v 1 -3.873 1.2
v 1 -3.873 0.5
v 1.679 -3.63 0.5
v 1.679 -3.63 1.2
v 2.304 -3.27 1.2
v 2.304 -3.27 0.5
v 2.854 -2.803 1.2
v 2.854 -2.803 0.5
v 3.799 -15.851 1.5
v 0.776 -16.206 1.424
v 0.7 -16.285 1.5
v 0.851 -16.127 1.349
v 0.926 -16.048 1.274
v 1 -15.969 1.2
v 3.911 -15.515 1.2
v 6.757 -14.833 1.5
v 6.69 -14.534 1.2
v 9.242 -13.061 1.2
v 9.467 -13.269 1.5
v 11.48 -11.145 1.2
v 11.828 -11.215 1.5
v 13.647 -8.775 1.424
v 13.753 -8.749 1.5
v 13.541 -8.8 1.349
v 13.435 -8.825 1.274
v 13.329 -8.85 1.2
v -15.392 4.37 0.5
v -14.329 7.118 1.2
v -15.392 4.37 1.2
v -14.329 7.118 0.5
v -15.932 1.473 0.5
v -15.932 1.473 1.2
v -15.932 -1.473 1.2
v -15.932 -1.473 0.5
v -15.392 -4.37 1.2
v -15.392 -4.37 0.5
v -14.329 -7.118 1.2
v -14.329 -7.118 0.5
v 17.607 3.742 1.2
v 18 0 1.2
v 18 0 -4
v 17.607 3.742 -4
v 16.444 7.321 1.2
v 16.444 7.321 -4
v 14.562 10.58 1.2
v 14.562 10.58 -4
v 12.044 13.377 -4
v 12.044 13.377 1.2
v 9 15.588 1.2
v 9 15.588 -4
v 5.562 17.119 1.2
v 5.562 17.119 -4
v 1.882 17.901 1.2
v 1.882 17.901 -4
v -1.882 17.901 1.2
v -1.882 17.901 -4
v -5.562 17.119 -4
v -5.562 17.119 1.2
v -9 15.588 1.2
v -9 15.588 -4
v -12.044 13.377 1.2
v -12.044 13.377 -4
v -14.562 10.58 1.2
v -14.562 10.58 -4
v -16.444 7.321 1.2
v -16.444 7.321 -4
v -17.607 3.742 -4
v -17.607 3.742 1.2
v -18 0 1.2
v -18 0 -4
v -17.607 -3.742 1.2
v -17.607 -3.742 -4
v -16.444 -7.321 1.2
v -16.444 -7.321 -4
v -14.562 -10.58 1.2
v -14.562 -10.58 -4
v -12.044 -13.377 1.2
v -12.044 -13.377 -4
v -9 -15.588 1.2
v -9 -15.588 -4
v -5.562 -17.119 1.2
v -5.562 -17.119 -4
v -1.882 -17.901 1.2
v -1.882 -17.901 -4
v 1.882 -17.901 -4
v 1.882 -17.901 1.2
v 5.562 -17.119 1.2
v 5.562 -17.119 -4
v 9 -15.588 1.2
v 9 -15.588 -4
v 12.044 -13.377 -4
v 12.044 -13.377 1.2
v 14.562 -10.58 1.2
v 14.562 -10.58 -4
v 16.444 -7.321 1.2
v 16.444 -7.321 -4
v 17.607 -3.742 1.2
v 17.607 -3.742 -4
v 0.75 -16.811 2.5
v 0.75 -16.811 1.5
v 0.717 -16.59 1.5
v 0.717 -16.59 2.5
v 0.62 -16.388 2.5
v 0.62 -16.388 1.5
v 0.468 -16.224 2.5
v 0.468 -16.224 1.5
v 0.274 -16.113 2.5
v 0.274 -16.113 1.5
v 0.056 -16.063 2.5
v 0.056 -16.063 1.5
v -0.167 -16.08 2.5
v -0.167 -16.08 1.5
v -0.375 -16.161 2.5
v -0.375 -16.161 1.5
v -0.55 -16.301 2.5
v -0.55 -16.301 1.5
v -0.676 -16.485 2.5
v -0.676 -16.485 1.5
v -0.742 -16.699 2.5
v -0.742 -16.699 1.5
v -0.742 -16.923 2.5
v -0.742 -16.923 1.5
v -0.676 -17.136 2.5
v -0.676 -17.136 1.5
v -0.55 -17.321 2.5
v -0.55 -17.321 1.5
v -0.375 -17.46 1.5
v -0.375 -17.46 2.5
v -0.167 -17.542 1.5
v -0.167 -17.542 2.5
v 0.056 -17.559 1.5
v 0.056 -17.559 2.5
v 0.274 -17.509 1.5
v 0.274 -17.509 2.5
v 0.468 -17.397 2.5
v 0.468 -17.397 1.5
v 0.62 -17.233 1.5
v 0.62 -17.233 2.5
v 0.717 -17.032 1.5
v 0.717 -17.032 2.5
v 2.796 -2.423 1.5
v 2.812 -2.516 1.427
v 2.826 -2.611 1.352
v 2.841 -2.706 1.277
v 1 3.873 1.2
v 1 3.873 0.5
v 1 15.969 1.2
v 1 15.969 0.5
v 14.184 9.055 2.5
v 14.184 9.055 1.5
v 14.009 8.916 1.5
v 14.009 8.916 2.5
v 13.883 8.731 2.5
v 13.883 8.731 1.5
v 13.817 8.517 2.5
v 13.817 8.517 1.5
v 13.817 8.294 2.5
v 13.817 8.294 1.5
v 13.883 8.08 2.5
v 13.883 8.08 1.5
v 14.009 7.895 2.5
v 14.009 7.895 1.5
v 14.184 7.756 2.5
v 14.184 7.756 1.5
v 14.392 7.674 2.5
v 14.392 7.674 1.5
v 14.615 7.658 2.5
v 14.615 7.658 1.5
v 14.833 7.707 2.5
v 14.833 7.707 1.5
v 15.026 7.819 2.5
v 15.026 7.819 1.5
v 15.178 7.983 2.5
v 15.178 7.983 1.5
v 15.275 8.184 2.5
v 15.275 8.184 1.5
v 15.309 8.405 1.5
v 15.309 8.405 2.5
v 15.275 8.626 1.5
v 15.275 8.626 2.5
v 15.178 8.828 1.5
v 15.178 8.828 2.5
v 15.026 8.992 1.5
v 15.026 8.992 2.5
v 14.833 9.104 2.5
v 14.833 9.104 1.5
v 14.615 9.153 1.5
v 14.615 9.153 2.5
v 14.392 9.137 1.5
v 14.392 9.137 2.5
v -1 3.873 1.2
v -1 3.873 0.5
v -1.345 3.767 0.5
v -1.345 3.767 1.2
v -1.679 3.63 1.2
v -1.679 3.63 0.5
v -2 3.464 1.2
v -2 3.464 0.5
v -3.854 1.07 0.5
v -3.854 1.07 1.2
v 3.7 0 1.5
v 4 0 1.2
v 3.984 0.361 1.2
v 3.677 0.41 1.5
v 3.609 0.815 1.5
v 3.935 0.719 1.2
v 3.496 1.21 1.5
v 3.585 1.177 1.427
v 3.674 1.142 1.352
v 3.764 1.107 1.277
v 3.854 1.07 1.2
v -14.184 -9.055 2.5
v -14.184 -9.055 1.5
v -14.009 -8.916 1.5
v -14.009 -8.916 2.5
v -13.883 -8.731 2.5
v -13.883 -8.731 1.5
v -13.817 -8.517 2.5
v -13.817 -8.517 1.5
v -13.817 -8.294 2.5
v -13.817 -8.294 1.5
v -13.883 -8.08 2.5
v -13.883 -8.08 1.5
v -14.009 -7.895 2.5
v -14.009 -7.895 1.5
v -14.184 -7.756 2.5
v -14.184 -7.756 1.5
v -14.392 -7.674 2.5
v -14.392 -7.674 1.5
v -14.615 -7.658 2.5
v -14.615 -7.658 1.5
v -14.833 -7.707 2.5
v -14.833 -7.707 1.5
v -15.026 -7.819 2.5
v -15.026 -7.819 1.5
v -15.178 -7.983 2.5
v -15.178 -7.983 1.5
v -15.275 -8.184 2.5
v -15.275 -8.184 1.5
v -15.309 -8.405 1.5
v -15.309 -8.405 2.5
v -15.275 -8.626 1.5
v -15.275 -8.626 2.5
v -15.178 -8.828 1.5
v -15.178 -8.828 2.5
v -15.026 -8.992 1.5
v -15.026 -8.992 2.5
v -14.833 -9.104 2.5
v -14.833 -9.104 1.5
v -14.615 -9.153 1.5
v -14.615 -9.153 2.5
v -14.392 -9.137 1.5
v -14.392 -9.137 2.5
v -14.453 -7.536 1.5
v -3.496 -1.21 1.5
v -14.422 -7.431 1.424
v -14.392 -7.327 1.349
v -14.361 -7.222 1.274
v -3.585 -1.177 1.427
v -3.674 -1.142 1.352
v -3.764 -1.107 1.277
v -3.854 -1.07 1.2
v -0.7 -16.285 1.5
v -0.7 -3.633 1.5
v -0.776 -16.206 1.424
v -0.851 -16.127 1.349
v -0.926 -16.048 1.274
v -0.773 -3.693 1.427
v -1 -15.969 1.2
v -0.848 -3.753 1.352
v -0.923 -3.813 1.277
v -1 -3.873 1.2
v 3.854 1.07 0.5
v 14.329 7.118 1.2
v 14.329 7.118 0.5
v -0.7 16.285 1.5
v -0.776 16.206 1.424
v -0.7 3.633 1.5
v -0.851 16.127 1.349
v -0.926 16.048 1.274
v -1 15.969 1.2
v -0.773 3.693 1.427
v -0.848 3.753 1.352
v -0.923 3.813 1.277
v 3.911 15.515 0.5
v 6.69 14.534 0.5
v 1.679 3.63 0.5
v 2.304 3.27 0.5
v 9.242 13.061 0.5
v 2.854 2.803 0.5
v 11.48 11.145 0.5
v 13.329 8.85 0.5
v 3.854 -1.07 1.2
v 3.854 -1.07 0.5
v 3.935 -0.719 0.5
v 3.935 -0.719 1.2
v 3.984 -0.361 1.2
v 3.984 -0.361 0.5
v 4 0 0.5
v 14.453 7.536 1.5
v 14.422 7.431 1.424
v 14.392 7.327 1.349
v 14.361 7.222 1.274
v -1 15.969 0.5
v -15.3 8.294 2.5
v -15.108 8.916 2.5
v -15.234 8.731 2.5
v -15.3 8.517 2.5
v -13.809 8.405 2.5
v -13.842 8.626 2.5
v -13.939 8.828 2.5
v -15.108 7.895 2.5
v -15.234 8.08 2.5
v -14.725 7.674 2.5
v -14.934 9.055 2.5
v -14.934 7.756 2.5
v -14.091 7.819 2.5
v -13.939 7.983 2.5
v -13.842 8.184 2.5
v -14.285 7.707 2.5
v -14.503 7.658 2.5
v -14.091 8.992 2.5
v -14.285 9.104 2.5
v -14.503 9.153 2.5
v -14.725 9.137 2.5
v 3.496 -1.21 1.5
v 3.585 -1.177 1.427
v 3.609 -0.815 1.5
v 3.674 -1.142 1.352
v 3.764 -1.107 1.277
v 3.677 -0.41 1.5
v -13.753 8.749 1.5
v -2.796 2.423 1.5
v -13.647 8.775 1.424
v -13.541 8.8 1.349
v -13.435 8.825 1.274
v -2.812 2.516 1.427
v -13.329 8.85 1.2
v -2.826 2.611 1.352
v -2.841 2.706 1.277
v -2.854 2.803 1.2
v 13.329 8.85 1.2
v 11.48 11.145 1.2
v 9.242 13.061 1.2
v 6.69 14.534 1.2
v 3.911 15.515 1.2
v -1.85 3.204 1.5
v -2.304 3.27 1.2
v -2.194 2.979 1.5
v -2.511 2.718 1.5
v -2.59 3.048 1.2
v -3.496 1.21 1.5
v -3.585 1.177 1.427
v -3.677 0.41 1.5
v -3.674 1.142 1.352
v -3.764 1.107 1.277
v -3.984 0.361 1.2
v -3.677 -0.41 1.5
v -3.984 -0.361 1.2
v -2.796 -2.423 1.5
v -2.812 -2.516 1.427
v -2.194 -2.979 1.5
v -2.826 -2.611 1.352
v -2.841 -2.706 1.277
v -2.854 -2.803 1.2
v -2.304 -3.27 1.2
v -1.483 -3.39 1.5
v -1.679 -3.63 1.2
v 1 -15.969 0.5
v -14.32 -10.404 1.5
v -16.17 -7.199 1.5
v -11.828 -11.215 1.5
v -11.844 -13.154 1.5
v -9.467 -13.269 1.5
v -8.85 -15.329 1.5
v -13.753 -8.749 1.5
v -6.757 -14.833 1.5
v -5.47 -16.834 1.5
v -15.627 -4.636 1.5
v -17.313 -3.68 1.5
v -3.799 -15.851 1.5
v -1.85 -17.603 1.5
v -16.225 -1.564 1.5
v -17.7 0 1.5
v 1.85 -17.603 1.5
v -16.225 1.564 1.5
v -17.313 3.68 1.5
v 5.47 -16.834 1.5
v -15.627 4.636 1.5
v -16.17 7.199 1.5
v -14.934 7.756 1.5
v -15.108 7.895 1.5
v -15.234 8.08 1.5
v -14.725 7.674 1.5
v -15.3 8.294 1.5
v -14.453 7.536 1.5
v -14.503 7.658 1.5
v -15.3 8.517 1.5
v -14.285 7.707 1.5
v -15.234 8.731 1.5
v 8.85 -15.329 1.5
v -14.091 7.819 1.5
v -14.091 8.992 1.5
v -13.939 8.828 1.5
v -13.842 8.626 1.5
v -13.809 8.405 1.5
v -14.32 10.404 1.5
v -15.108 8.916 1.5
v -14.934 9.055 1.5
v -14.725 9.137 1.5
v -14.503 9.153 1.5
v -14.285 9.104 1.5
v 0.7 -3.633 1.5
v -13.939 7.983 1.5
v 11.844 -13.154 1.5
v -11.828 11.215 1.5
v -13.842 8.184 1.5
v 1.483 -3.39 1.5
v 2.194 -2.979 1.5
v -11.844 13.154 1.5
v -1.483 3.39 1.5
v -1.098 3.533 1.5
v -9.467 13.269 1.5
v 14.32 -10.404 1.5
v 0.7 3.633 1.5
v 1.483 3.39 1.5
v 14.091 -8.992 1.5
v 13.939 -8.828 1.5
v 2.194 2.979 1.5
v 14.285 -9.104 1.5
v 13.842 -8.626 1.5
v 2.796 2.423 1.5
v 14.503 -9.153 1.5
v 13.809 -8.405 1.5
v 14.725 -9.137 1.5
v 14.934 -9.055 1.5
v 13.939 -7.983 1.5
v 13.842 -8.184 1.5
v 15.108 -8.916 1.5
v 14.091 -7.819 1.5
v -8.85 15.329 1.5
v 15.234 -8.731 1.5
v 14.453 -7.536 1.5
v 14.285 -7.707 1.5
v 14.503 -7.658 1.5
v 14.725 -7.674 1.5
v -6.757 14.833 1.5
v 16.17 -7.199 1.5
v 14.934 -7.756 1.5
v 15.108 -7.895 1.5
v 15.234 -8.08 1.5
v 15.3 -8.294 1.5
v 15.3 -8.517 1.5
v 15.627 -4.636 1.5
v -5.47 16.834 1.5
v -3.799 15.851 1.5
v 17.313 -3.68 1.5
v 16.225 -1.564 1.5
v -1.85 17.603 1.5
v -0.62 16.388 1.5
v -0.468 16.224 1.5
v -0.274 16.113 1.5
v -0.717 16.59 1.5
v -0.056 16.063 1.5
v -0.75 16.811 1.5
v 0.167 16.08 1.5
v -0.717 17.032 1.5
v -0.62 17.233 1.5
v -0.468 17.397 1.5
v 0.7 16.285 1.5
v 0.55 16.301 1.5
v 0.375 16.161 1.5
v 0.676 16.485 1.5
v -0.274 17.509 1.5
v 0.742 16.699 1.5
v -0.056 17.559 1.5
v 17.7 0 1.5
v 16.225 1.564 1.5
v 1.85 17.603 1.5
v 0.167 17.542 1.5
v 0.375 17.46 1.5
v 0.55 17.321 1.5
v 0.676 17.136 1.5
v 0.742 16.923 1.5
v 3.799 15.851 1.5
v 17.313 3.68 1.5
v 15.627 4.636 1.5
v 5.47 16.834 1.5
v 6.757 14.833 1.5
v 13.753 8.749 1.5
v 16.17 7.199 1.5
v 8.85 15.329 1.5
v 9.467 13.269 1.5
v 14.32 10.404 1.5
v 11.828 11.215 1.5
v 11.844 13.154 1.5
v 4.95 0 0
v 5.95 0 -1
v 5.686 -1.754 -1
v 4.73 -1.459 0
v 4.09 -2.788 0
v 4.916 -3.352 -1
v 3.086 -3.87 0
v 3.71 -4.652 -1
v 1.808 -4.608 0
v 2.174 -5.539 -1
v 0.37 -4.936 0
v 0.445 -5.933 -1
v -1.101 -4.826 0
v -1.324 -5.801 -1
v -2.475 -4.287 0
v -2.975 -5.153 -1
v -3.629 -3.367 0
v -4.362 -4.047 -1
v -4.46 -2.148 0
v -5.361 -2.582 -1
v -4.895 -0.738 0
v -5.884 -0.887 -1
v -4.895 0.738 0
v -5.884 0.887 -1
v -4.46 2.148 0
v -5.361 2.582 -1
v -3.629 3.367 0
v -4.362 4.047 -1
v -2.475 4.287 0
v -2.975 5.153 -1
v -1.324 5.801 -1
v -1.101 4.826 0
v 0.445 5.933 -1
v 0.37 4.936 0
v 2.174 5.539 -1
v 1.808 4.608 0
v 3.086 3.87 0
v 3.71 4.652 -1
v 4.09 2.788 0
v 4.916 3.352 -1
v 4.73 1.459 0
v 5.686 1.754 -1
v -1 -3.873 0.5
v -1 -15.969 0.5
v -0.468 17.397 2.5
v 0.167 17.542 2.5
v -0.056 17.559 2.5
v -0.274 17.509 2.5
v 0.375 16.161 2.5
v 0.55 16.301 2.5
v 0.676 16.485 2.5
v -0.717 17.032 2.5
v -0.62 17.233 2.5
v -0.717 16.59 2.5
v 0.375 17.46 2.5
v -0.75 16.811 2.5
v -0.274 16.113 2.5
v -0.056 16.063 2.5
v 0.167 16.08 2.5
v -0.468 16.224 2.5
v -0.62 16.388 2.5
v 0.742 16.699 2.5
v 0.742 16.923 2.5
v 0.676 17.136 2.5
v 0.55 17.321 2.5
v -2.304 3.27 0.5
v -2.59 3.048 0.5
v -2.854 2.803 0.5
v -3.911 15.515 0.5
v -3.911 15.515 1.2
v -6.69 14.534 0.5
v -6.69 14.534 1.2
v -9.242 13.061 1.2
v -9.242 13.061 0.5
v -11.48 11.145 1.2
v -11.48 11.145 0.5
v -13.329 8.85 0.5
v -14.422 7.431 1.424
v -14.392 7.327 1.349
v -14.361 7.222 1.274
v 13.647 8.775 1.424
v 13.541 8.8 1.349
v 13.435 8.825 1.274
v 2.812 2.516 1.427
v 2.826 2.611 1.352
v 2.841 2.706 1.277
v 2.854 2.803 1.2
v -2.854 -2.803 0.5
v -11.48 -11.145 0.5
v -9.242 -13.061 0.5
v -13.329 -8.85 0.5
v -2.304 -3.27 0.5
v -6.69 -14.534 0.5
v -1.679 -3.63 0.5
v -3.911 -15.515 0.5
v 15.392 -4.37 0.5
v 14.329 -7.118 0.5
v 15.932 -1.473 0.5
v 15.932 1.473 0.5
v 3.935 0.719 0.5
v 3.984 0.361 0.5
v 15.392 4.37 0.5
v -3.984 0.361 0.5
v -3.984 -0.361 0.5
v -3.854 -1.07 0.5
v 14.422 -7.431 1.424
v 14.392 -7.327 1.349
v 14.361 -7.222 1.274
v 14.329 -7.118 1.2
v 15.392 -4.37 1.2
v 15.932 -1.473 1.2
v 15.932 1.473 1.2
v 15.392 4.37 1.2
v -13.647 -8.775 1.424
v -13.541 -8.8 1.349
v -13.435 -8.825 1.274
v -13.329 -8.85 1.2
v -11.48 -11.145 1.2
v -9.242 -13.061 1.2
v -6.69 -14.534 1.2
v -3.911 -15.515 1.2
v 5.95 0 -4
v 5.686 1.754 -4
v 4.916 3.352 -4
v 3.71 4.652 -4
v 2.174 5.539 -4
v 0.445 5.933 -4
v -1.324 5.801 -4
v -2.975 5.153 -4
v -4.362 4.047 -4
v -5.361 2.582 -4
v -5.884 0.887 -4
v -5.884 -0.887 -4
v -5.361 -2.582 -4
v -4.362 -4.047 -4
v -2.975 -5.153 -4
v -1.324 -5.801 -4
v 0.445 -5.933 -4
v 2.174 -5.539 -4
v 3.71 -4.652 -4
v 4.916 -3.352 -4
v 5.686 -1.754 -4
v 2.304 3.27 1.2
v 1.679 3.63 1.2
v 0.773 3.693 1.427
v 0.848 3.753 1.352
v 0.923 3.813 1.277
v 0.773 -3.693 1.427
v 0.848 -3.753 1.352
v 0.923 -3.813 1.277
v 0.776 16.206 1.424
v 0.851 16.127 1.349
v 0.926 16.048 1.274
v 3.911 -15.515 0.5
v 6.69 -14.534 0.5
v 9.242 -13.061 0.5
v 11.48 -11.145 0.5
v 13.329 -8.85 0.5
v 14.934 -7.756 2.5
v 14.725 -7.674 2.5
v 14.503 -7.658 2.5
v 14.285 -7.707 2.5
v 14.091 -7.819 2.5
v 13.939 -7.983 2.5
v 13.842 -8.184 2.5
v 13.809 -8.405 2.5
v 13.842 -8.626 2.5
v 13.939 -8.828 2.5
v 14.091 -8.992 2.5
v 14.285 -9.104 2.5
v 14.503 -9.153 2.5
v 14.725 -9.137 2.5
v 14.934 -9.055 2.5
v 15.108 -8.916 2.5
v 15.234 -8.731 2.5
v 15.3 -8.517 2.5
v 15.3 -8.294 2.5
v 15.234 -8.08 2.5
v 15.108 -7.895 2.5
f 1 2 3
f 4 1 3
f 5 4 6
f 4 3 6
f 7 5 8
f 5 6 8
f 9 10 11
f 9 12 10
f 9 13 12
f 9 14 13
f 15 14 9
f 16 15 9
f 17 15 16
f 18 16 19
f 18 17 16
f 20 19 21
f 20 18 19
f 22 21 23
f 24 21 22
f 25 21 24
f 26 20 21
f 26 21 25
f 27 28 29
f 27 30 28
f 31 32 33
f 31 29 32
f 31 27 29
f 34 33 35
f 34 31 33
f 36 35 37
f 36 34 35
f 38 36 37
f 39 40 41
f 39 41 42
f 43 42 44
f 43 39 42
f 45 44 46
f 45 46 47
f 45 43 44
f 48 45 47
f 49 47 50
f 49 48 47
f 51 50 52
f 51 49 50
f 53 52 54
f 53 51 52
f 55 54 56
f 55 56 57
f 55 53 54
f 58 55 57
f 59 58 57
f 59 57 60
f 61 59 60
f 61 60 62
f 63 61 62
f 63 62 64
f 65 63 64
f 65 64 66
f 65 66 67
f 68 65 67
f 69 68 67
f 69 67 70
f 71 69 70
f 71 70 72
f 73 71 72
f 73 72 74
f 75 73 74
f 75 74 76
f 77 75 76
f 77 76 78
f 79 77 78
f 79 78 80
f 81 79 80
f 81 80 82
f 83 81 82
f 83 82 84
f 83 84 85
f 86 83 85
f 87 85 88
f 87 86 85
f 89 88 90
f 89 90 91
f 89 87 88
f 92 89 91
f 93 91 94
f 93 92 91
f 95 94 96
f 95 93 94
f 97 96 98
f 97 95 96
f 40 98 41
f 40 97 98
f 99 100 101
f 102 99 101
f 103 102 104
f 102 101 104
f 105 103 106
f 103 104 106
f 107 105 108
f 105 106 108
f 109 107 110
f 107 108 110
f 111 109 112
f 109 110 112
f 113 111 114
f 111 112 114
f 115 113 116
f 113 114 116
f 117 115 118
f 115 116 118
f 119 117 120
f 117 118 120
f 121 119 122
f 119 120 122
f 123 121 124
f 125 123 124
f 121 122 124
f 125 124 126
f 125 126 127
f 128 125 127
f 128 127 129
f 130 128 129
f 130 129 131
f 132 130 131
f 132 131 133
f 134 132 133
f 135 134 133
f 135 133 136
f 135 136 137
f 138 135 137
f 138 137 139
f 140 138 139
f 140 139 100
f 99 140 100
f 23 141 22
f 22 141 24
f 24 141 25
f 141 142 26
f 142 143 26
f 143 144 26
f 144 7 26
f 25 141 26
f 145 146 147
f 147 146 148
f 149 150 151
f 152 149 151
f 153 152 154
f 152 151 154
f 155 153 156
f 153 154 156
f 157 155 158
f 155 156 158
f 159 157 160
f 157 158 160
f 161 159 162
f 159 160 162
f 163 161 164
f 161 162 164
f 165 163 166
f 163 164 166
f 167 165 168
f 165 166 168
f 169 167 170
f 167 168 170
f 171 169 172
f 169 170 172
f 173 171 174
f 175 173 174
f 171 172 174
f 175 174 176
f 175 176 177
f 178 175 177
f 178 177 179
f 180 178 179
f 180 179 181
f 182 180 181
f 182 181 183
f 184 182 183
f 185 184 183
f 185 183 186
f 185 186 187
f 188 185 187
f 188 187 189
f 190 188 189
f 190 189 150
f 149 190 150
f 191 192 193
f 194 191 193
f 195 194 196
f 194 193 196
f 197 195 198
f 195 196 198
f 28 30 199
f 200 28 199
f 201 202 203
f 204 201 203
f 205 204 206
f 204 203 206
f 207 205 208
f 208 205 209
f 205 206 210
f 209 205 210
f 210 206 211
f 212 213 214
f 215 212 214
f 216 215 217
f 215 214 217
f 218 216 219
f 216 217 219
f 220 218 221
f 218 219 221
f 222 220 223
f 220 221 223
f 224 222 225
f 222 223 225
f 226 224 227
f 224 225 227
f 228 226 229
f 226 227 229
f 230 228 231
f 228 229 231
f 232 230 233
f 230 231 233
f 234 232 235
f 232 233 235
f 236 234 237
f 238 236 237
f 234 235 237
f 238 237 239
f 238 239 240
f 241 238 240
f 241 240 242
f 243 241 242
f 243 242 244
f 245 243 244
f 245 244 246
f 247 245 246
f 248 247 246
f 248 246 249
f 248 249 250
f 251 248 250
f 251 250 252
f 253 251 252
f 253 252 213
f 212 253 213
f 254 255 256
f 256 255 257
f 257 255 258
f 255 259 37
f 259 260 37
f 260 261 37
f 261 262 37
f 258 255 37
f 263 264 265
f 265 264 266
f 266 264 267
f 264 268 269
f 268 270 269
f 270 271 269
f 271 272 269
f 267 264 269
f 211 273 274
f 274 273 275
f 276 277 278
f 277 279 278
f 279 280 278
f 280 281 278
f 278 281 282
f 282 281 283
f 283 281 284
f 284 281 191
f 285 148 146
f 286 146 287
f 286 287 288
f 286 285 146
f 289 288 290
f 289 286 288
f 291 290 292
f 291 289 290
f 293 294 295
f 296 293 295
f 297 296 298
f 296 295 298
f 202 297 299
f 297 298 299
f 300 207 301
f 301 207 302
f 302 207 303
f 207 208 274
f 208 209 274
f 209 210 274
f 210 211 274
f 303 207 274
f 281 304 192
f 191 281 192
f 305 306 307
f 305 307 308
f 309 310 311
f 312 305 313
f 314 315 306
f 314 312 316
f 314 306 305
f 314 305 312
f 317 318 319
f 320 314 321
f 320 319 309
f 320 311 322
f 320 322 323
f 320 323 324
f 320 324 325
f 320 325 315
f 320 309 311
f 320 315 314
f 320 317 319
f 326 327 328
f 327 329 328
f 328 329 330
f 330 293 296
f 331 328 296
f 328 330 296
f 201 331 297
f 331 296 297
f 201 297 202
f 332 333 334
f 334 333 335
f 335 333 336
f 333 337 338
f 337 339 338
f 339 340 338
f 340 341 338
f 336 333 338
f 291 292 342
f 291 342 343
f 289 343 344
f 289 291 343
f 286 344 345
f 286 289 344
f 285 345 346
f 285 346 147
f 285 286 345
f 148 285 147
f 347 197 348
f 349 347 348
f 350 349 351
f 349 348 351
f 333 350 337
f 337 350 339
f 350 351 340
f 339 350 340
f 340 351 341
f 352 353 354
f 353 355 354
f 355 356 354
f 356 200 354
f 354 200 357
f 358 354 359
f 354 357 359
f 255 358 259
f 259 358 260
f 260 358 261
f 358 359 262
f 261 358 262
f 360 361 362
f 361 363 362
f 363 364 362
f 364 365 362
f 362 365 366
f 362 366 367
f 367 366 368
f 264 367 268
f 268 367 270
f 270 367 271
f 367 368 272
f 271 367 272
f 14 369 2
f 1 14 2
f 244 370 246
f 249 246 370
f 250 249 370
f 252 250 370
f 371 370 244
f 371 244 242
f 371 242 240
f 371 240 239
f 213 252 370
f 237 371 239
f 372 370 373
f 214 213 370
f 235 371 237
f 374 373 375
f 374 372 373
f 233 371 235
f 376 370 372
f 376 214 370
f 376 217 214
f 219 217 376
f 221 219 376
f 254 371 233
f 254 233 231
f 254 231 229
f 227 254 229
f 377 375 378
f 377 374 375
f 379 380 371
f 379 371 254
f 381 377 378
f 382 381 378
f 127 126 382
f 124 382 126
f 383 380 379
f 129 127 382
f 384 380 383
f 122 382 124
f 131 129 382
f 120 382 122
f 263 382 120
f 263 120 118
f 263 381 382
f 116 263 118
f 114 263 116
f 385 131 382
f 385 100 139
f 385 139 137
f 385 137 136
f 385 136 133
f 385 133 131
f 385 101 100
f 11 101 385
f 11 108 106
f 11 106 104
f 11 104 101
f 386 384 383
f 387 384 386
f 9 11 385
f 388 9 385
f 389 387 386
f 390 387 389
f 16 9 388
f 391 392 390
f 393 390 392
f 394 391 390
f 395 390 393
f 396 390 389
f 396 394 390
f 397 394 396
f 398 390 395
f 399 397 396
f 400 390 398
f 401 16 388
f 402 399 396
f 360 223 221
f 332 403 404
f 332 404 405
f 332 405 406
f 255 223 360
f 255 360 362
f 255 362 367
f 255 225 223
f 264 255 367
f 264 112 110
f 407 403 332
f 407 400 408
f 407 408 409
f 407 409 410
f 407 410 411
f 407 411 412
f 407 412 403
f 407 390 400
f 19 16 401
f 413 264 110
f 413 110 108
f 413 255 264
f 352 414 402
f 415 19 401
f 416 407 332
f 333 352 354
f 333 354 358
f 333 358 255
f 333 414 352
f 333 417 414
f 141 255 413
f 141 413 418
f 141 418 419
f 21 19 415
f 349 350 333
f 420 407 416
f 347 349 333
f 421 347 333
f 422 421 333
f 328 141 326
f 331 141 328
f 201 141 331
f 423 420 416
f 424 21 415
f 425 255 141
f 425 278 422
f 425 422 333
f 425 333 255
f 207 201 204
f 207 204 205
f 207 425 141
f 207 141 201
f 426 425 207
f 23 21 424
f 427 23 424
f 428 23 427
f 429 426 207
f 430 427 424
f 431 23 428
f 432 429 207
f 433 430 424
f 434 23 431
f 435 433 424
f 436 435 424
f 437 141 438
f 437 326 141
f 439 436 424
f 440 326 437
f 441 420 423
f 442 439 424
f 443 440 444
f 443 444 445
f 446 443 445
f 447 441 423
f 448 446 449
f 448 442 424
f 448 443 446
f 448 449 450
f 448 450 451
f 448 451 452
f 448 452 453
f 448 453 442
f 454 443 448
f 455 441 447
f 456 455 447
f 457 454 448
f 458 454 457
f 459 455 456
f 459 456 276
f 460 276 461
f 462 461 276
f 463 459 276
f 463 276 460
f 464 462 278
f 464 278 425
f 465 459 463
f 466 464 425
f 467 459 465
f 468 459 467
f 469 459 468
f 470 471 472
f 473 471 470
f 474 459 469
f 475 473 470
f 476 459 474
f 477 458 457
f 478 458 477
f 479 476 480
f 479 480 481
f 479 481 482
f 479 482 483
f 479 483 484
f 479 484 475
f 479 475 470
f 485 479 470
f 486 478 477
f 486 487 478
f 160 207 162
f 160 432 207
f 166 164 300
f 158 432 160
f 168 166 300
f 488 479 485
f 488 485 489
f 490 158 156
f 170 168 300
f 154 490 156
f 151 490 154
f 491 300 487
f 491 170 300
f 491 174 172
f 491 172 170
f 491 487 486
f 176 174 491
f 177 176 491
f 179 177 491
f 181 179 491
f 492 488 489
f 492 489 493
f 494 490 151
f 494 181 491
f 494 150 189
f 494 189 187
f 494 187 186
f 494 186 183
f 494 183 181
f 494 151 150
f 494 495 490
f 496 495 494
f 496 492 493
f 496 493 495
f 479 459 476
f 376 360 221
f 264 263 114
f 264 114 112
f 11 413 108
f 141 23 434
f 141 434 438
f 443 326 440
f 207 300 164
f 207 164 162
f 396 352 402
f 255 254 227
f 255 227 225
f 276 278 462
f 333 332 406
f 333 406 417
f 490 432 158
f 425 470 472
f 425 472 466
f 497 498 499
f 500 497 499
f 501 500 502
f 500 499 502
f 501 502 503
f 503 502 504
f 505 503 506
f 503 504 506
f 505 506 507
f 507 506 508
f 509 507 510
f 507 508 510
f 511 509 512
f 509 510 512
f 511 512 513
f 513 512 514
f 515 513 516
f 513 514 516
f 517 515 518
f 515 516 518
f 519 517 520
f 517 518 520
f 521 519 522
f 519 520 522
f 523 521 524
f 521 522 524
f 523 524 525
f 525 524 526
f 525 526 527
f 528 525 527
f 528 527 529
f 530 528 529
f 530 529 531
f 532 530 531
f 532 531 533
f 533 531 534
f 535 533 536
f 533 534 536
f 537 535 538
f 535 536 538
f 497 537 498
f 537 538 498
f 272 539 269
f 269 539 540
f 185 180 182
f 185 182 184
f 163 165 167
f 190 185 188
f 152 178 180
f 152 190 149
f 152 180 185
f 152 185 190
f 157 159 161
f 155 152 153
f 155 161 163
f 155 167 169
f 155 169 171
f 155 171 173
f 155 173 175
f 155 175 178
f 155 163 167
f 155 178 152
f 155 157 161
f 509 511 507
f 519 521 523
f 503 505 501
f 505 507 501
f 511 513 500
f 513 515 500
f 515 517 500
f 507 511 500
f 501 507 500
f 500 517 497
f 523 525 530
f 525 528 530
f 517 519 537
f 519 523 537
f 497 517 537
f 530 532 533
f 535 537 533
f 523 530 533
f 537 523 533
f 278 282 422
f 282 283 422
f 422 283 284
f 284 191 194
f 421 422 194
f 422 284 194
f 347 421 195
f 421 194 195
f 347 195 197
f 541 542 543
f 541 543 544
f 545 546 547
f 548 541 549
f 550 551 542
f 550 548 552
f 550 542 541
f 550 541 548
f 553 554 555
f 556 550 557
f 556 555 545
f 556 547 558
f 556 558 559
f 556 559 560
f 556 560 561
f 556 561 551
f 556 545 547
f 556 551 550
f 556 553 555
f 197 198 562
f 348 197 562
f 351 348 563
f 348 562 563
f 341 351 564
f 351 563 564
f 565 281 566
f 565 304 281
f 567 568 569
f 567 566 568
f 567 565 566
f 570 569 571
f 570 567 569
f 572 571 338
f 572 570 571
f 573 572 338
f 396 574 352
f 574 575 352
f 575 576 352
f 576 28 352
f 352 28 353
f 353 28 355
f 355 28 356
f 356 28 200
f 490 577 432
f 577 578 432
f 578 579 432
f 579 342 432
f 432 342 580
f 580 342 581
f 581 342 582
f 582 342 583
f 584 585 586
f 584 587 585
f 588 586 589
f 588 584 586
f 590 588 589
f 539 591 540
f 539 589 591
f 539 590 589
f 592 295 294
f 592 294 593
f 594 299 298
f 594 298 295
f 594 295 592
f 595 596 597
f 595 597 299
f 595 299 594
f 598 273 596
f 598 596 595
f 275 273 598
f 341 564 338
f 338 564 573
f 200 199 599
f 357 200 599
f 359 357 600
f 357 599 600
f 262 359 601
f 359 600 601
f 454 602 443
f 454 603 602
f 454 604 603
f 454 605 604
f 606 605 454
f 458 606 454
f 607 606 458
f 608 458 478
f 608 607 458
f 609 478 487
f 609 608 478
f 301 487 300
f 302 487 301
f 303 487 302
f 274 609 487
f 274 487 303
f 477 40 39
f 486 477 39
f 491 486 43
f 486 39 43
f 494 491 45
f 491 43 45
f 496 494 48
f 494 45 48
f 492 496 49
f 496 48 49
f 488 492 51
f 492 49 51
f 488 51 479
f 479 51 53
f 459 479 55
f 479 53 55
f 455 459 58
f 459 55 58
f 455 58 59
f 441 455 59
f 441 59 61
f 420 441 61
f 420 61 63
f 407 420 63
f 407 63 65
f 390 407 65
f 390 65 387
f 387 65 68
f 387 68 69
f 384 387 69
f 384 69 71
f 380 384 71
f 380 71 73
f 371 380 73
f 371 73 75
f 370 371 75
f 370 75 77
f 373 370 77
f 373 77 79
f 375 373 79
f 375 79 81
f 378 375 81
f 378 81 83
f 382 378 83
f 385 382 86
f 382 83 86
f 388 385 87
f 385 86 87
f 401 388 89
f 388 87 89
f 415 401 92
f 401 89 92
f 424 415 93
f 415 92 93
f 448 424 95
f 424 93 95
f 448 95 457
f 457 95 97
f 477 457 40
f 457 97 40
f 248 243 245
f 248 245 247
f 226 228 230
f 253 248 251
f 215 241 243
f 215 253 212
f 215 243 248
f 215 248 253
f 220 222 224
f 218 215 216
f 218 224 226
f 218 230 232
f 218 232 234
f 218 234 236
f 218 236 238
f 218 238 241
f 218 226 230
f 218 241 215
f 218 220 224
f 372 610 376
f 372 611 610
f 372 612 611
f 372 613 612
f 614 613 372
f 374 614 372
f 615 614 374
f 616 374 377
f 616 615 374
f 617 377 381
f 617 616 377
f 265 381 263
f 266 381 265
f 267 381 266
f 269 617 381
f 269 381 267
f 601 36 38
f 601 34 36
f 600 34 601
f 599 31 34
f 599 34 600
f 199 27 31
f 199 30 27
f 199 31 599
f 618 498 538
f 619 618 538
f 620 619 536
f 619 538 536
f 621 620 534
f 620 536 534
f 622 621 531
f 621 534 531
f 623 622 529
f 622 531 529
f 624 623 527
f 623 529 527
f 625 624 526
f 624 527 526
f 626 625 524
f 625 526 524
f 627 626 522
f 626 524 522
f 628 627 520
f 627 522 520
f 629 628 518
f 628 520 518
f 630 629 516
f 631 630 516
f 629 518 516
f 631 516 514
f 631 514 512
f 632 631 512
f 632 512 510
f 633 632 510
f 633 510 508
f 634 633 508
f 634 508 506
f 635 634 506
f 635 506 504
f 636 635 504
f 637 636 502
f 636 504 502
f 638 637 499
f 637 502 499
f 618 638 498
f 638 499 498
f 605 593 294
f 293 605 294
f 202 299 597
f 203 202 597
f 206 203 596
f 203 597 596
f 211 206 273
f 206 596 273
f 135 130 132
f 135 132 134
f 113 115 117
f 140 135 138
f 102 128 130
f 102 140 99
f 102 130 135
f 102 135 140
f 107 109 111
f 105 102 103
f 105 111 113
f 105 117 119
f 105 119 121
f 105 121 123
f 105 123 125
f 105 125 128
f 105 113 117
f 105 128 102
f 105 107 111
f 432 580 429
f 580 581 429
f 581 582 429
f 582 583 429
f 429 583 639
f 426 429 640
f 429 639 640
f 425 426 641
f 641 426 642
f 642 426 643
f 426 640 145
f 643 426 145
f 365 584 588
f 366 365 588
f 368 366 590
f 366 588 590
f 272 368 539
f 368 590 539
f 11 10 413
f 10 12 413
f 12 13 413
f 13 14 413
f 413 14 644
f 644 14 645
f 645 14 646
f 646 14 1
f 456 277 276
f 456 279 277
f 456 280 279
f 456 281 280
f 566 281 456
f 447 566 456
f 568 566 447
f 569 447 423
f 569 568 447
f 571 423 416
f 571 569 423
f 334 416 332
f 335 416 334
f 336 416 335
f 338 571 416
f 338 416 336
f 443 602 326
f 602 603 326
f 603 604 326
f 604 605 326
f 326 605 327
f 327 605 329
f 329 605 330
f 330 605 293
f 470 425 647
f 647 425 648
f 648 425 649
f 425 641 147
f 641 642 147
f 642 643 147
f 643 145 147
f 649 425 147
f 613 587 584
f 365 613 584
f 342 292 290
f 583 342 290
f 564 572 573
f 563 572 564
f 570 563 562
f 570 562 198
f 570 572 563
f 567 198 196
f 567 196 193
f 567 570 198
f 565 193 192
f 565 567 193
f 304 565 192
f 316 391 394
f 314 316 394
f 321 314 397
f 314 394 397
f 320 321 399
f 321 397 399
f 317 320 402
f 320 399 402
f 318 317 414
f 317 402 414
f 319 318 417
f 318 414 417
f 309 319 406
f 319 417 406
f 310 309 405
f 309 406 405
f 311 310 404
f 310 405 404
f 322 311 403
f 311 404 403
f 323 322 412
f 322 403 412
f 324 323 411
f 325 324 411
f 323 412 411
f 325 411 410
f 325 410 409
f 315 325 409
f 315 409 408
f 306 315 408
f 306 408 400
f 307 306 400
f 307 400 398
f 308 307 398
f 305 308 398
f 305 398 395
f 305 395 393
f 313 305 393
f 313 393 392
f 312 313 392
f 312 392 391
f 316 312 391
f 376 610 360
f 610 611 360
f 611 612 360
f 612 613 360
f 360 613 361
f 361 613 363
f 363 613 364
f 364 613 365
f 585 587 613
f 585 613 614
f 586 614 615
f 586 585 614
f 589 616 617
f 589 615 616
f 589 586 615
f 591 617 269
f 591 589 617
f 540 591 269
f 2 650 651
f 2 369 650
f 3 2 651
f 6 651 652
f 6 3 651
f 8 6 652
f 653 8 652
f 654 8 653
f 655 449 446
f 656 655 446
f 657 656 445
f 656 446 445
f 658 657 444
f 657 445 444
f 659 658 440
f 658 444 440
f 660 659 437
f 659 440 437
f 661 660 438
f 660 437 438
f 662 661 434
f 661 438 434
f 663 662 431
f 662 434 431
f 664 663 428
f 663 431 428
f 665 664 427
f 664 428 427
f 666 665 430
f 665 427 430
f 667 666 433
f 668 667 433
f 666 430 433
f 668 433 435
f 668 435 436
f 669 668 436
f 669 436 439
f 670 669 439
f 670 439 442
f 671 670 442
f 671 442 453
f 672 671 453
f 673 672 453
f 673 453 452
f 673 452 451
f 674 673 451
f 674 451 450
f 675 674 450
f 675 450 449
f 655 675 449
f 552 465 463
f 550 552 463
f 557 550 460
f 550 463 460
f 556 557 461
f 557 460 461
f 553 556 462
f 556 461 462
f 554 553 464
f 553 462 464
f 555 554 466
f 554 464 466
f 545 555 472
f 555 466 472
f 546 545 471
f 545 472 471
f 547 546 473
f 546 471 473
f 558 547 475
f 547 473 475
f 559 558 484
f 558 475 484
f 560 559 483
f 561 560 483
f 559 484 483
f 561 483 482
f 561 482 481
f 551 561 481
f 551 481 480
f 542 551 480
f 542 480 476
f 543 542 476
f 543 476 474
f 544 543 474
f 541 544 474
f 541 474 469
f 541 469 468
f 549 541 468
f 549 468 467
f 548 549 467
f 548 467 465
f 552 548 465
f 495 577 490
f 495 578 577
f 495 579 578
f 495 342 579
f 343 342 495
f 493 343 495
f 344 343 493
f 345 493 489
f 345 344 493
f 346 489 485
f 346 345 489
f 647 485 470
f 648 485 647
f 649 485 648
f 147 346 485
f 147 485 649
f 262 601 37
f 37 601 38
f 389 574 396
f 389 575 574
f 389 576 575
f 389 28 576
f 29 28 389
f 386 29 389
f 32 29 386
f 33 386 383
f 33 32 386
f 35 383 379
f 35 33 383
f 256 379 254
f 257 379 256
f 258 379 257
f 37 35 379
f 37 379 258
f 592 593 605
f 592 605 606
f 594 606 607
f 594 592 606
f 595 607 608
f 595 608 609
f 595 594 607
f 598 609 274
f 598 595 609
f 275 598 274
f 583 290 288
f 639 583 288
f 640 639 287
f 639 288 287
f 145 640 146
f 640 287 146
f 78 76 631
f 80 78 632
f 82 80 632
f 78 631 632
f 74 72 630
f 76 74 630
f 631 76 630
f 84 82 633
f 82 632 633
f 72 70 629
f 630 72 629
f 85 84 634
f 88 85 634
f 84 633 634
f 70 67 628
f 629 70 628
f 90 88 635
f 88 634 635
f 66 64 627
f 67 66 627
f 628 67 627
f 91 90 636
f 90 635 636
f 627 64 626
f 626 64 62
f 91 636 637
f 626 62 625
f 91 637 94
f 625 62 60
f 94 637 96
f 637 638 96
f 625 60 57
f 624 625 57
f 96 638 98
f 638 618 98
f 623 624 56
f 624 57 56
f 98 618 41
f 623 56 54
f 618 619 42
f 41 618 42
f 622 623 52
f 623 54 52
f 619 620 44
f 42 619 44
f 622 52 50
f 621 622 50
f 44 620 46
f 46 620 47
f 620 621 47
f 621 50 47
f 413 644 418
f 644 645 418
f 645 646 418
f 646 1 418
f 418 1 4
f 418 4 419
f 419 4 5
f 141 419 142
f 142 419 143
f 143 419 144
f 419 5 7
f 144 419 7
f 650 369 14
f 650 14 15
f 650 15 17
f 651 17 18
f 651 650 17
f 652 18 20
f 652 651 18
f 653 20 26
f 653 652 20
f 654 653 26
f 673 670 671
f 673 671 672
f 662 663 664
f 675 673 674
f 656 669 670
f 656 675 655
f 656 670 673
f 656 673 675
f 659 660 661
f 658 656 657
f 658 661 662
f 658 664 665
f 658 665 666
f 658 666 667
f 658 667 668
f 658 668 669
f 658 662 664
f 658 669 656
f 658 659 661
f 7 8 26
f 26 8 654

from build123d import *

# Parameters (mm, degrees)
F0_R      = 18
F0_R_2    = 5.95
F1_DEPTH  = 4
F2_R      = 18
F2_R_2    = 16
F3_DEPTH  = 1.5
F5_DEPTH  = 1.5
F6_SIZE   = 0.3
F7_COUNT  = 3
F8_R      = 0.75
F9_DEPTH  = 2.5
F10_COUNT = 6
F11_R     = 17
F12_DEPTH = 0.5
F13_SIZE  = 1


with BuildPart() as f1:
    # F0 (on Top) → F1 (new body)
    with BuildSketch(Plane.XY):
        Circle(F0_R)
        Circle(F0_R_2, mode=Mode.SUBTRACT)
    extrude(amount=-F1_DEPTH)

    # F2 (on Top) → F3 (join)
    with BuildSketch(Plane.XY):
        Circle(F2_R)
        Circle(F2_R_2, mode=Mode.SUBTRACT)
    extrude(amount=F3_DEPTH)

    # F4 (on Top) → F5 (join)
    with BuildSketch(Plane.XY):
        with BuildLine():
            Line((-1, -16.7781973636), (1, -16.7781973636))
            Line((1, -16.7781973636), (1, -3.8729833462))
            ThreePointArc((1, -3.8729833462), (0, -4), (-1, -3.8729833462))
            Line((-1, -3.8729833462), (-1, -16.7781973636))
        make_face()
        with BuildLine():
            ThreePointArc((-1, -3.8729833462), (0, -4), (1, -3.8729833462))
            Line((1, -3.8729833462), (1, 3.8729833462))
            ThreePointArc((1, 3.8729833462), (0, 4), (-1, 3.8729833462))
            Line((-1, 3.8729833462), (-1, -3.8729833462))
        make_face()
        with BuildLine():
            Line((1, 3.8729833462), (1, -3.8729833462))
            ThreePointArc((1, -3.8729833462), (3.1622776602, -2.4494897428), (4, 0))
            ThreePointArc((4, 0), (3.1622776602, 2.4494897428), (1, 3.8729833462))
        make_face()
        with BuildLine():
            ThreePointArc((-1, 3.8729833462), (-4, 0), (-1, -3.8729833462))
            Line((-1, -3.8729833462), (-1, 3.8729833462))
        make_face()
        with BuildLine():
            ThreePointArc((-1, 3.8729833462), (0, 4), (1, 3.8729833462))
            Line((1, 3.8729833462), (1, 16.7781973636))
            Line((1, 16.7781973636), (-1, 16.7781973636))
            Line((-1, 16.7781973636), (-1, 3.8729833462))
        make_face()
    extrude(amount=F5_DEPTH)

    # F6
    f6_edges = [f1.edges().sort_by_distance(p)[0] for p in [
        (-18, 0, 1.5),
        (16, 0, 1.5),
        (1, -9.920851, 1.5),
        (4, 0, 1.5),
        (1, 9.920851, 1.5),
        (-16, 0, 1.5),
        (-1, 9.920851, 1.5),
        (-4, 0, 1.5),
        (-1, -9.920851, 1.5),
    ]]
    chamfer(f6_edges, length=F6_SIZE)

    # F7: F1 ×3 about axis
    f7_axis = Axis((0, 0, 0), (0, 0, 1))


with BuildPart() as f1_1:
    add(f1.part)
    for i in range(1, F7_COUNT):
        add(f1.part.rotate(f7_axis, i * 360 / F7_COUNT))

    # F8 (on Top) → F9 (join)
    with BuildSketch(Plane.XY):
        with Locations((0, -16.8108288199)):
            Circle(F8_R)
    extrude(amount=F9_DEPTH)

    # F10: F1 ×6 about axis
    f10_axis = Axis((0, 0, 1.2), (0, 0, -1))


with BuildPart() as f1_2:
    add(f1_1.part)
    for i in range(1, F10_COUNT):
        add(f1_1.part.rotate(f10_axis, i * 360 / F10_COUNT))

    # F11 (on Top) → F12 (join)
    with BuildSketch(Plane.XY):
        Circle(F11_R)
    extrude(amount=F12_DEPTH)

    # F13
    f13_edges = [f1_2.edges().sort_by_distance(p)[0] for p in [
        (-5.95, 0, 0),
    ]]
    chamfer(f13_edges, length=F13_SIZE)


solid = f1_2.part
